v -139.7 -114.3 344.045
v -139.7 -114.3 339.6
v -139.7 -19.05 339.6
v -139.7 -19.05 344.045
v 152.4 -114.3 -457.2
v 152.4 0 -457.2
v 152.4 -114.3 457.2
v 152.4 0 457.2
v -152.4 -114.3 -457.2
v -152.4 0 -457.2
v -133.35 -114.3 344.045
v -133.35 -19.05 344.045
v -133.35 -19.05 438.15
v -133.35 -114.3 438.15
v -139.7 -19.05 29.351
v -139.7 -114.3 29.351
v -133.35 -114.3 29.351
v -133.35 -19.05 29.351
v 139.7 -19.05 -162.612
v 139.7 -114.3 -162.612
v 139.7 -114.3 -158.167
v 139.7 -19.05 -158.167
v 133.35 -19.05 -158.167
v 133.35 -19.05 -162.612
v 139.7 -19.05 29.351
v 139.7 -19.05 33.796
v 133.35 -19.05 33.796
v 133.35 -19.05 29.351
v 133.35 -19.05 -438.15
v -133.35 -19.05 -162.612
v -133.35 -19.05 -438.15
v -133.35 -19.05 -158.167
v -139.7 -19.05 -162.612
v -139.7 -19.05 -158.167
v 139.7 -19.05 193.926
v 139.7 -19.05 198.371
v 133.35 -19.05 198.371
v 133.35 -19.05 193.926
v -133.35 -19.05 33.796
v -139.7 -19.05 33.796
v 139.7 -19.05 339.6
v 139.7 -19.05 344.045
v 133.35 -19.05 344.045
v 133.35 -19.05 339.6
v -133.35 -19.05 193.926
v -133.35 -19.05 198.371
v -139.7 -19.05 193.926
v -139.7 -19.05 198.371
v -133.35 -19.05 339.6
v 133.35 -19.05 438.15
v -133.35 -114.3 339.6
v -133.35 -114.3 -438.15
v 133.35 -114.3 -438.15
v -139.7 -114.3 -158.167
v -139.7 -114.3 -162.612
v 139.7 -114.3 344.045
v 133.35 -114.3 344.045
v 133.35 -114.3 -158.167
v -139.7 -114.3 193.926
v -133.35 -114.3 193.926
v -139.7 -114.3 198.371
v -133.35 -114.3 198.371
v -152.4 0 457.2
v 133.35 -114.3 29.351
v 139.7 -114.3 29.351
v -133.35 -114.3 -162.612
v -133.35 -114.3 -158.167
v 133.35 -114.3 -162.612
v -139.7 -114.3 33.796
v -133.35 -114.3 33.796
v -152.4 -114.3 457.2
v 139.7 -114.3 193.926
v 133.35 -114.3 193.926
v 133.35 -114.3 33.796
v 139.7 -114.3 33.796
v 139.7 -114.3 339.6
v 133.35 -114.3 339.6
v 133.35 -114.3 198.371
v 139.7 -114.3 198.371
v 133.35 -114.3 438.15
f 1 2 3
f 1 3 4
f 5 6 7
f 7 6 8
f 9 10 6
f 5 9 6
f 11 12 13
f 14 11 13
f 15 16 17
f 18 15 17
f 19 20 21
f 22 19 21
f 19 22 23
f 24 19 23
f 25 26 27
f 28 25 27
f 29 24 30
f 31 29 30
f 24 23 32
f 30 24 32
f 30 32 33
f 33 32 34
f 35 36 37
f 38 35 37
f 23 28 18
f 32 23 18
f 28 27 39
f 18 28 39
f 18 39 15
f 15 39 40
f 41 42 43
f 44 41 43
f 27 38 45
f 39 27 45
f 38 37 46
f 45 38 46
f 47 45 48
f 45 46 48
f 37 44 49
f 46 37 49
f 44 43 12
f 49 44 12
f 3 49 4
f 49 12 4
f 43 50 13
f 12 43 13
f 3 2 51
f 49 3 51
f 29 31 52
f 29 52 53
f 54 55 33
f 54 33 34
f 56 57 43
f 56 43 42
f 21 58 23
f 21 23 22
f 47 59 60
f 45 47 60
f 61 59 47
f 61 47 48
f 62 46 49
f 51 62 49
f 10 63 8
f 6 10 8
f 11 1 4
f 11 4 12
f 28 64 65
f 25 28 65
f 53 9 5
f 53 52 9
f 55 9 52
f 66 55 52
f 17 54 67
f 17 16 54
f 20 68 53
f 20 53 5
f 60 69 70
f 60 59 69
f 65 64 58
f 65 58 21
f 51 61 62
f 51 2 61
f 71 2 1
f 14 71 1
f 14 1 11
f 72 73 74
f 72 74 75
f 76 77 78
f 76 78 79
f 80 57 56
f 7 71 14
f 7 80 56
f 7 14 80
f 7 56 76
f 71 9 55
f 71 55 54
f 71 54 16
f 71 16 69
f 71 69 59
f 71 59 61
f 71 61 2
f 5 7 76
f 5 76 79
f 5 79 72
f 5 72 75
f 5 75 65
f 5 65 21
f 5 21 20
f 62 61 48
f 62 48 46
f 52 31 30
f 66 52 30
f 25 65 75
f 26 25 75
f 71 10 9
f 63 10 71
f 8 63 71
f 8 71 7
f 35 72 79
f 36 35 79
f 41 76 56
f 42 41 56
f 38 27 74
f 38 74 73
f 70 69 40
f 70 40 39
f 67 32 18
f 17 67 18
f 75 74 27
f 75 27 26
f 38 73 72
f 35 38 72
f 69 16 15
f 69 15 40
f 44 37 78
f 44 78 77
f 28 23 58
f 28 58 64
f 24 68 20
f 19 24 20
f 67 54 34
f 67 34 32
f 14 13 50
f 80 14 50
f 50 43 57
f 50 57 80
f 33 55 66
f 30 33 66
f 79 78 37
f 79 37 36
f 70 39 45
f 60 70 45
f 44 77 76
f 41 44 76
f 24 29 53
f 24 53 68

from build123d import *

# Parameters (mm, degrees)
F0_W     = 304.8
F0_H     = 914.4
F0_W_2   = 266.7
F0_H_2   = 876.3
F1_DEPTH = 114.3
F2_W     = 304.8
F2_H     = 914.4
F3_DEPTH = 19.05
F4_W     = 6.35
F4_H     = 4.445
F5_DEPTH = 95.25


with BuildPart() as f1:
    # F0 (on Front) → F1 (new body)
    with BuildSketch(Plane.XZ):
        Rectangle(F0_W, F0_H)
        Rectangle(F0_W_2, F0_H_2, mode=Mode.SUBTRACT)
    extrude(amount=F1_DEPTH)

    # F2 (on face) → F3 (join)
    with BuildSketch(Plane(origin=(0, 0, 0), x_dir=(-1, 0, 0), z_dir=(0, 1, 0))):
        Rectangle(F2_W, F2_H)
    extrude(amount=-F3_DEPTH)

    # F4 (on face) → F5 (cut)
    with BuildSketch(Plane.XZ.offset(114.3)):
        with Locations((-136.525, 341.822318)):
            Rectangle(F4_W, F4_H)
        with Locations((-136.525, 196.148134)):
            Rectangle(F4_W, F4_H)
        with Locations((-136.525, 31.573584)):
            Rectangle(F4_W, F4_H)
        with Locations((-136.525, -160.389908)):
            Rectangle(F4_W, F4_H)
        with Locations((136.525, 196.148134)):
            Rectangle(F4_W, F4_H)
        with Locations((136.525, 341.822318)):
            Rectangle(F4_W, F4_H)
        with Locations((136.525, -160.389908)):
            Rectangle(F4_W, F4_H)
        with Locations((136.525, 31.573584)):
            Rectangle(F4_W, F4_H)
    extrude(amount=-F5_DEPTH, mode=Mode.SUBTRACT)


solid = f1.part
